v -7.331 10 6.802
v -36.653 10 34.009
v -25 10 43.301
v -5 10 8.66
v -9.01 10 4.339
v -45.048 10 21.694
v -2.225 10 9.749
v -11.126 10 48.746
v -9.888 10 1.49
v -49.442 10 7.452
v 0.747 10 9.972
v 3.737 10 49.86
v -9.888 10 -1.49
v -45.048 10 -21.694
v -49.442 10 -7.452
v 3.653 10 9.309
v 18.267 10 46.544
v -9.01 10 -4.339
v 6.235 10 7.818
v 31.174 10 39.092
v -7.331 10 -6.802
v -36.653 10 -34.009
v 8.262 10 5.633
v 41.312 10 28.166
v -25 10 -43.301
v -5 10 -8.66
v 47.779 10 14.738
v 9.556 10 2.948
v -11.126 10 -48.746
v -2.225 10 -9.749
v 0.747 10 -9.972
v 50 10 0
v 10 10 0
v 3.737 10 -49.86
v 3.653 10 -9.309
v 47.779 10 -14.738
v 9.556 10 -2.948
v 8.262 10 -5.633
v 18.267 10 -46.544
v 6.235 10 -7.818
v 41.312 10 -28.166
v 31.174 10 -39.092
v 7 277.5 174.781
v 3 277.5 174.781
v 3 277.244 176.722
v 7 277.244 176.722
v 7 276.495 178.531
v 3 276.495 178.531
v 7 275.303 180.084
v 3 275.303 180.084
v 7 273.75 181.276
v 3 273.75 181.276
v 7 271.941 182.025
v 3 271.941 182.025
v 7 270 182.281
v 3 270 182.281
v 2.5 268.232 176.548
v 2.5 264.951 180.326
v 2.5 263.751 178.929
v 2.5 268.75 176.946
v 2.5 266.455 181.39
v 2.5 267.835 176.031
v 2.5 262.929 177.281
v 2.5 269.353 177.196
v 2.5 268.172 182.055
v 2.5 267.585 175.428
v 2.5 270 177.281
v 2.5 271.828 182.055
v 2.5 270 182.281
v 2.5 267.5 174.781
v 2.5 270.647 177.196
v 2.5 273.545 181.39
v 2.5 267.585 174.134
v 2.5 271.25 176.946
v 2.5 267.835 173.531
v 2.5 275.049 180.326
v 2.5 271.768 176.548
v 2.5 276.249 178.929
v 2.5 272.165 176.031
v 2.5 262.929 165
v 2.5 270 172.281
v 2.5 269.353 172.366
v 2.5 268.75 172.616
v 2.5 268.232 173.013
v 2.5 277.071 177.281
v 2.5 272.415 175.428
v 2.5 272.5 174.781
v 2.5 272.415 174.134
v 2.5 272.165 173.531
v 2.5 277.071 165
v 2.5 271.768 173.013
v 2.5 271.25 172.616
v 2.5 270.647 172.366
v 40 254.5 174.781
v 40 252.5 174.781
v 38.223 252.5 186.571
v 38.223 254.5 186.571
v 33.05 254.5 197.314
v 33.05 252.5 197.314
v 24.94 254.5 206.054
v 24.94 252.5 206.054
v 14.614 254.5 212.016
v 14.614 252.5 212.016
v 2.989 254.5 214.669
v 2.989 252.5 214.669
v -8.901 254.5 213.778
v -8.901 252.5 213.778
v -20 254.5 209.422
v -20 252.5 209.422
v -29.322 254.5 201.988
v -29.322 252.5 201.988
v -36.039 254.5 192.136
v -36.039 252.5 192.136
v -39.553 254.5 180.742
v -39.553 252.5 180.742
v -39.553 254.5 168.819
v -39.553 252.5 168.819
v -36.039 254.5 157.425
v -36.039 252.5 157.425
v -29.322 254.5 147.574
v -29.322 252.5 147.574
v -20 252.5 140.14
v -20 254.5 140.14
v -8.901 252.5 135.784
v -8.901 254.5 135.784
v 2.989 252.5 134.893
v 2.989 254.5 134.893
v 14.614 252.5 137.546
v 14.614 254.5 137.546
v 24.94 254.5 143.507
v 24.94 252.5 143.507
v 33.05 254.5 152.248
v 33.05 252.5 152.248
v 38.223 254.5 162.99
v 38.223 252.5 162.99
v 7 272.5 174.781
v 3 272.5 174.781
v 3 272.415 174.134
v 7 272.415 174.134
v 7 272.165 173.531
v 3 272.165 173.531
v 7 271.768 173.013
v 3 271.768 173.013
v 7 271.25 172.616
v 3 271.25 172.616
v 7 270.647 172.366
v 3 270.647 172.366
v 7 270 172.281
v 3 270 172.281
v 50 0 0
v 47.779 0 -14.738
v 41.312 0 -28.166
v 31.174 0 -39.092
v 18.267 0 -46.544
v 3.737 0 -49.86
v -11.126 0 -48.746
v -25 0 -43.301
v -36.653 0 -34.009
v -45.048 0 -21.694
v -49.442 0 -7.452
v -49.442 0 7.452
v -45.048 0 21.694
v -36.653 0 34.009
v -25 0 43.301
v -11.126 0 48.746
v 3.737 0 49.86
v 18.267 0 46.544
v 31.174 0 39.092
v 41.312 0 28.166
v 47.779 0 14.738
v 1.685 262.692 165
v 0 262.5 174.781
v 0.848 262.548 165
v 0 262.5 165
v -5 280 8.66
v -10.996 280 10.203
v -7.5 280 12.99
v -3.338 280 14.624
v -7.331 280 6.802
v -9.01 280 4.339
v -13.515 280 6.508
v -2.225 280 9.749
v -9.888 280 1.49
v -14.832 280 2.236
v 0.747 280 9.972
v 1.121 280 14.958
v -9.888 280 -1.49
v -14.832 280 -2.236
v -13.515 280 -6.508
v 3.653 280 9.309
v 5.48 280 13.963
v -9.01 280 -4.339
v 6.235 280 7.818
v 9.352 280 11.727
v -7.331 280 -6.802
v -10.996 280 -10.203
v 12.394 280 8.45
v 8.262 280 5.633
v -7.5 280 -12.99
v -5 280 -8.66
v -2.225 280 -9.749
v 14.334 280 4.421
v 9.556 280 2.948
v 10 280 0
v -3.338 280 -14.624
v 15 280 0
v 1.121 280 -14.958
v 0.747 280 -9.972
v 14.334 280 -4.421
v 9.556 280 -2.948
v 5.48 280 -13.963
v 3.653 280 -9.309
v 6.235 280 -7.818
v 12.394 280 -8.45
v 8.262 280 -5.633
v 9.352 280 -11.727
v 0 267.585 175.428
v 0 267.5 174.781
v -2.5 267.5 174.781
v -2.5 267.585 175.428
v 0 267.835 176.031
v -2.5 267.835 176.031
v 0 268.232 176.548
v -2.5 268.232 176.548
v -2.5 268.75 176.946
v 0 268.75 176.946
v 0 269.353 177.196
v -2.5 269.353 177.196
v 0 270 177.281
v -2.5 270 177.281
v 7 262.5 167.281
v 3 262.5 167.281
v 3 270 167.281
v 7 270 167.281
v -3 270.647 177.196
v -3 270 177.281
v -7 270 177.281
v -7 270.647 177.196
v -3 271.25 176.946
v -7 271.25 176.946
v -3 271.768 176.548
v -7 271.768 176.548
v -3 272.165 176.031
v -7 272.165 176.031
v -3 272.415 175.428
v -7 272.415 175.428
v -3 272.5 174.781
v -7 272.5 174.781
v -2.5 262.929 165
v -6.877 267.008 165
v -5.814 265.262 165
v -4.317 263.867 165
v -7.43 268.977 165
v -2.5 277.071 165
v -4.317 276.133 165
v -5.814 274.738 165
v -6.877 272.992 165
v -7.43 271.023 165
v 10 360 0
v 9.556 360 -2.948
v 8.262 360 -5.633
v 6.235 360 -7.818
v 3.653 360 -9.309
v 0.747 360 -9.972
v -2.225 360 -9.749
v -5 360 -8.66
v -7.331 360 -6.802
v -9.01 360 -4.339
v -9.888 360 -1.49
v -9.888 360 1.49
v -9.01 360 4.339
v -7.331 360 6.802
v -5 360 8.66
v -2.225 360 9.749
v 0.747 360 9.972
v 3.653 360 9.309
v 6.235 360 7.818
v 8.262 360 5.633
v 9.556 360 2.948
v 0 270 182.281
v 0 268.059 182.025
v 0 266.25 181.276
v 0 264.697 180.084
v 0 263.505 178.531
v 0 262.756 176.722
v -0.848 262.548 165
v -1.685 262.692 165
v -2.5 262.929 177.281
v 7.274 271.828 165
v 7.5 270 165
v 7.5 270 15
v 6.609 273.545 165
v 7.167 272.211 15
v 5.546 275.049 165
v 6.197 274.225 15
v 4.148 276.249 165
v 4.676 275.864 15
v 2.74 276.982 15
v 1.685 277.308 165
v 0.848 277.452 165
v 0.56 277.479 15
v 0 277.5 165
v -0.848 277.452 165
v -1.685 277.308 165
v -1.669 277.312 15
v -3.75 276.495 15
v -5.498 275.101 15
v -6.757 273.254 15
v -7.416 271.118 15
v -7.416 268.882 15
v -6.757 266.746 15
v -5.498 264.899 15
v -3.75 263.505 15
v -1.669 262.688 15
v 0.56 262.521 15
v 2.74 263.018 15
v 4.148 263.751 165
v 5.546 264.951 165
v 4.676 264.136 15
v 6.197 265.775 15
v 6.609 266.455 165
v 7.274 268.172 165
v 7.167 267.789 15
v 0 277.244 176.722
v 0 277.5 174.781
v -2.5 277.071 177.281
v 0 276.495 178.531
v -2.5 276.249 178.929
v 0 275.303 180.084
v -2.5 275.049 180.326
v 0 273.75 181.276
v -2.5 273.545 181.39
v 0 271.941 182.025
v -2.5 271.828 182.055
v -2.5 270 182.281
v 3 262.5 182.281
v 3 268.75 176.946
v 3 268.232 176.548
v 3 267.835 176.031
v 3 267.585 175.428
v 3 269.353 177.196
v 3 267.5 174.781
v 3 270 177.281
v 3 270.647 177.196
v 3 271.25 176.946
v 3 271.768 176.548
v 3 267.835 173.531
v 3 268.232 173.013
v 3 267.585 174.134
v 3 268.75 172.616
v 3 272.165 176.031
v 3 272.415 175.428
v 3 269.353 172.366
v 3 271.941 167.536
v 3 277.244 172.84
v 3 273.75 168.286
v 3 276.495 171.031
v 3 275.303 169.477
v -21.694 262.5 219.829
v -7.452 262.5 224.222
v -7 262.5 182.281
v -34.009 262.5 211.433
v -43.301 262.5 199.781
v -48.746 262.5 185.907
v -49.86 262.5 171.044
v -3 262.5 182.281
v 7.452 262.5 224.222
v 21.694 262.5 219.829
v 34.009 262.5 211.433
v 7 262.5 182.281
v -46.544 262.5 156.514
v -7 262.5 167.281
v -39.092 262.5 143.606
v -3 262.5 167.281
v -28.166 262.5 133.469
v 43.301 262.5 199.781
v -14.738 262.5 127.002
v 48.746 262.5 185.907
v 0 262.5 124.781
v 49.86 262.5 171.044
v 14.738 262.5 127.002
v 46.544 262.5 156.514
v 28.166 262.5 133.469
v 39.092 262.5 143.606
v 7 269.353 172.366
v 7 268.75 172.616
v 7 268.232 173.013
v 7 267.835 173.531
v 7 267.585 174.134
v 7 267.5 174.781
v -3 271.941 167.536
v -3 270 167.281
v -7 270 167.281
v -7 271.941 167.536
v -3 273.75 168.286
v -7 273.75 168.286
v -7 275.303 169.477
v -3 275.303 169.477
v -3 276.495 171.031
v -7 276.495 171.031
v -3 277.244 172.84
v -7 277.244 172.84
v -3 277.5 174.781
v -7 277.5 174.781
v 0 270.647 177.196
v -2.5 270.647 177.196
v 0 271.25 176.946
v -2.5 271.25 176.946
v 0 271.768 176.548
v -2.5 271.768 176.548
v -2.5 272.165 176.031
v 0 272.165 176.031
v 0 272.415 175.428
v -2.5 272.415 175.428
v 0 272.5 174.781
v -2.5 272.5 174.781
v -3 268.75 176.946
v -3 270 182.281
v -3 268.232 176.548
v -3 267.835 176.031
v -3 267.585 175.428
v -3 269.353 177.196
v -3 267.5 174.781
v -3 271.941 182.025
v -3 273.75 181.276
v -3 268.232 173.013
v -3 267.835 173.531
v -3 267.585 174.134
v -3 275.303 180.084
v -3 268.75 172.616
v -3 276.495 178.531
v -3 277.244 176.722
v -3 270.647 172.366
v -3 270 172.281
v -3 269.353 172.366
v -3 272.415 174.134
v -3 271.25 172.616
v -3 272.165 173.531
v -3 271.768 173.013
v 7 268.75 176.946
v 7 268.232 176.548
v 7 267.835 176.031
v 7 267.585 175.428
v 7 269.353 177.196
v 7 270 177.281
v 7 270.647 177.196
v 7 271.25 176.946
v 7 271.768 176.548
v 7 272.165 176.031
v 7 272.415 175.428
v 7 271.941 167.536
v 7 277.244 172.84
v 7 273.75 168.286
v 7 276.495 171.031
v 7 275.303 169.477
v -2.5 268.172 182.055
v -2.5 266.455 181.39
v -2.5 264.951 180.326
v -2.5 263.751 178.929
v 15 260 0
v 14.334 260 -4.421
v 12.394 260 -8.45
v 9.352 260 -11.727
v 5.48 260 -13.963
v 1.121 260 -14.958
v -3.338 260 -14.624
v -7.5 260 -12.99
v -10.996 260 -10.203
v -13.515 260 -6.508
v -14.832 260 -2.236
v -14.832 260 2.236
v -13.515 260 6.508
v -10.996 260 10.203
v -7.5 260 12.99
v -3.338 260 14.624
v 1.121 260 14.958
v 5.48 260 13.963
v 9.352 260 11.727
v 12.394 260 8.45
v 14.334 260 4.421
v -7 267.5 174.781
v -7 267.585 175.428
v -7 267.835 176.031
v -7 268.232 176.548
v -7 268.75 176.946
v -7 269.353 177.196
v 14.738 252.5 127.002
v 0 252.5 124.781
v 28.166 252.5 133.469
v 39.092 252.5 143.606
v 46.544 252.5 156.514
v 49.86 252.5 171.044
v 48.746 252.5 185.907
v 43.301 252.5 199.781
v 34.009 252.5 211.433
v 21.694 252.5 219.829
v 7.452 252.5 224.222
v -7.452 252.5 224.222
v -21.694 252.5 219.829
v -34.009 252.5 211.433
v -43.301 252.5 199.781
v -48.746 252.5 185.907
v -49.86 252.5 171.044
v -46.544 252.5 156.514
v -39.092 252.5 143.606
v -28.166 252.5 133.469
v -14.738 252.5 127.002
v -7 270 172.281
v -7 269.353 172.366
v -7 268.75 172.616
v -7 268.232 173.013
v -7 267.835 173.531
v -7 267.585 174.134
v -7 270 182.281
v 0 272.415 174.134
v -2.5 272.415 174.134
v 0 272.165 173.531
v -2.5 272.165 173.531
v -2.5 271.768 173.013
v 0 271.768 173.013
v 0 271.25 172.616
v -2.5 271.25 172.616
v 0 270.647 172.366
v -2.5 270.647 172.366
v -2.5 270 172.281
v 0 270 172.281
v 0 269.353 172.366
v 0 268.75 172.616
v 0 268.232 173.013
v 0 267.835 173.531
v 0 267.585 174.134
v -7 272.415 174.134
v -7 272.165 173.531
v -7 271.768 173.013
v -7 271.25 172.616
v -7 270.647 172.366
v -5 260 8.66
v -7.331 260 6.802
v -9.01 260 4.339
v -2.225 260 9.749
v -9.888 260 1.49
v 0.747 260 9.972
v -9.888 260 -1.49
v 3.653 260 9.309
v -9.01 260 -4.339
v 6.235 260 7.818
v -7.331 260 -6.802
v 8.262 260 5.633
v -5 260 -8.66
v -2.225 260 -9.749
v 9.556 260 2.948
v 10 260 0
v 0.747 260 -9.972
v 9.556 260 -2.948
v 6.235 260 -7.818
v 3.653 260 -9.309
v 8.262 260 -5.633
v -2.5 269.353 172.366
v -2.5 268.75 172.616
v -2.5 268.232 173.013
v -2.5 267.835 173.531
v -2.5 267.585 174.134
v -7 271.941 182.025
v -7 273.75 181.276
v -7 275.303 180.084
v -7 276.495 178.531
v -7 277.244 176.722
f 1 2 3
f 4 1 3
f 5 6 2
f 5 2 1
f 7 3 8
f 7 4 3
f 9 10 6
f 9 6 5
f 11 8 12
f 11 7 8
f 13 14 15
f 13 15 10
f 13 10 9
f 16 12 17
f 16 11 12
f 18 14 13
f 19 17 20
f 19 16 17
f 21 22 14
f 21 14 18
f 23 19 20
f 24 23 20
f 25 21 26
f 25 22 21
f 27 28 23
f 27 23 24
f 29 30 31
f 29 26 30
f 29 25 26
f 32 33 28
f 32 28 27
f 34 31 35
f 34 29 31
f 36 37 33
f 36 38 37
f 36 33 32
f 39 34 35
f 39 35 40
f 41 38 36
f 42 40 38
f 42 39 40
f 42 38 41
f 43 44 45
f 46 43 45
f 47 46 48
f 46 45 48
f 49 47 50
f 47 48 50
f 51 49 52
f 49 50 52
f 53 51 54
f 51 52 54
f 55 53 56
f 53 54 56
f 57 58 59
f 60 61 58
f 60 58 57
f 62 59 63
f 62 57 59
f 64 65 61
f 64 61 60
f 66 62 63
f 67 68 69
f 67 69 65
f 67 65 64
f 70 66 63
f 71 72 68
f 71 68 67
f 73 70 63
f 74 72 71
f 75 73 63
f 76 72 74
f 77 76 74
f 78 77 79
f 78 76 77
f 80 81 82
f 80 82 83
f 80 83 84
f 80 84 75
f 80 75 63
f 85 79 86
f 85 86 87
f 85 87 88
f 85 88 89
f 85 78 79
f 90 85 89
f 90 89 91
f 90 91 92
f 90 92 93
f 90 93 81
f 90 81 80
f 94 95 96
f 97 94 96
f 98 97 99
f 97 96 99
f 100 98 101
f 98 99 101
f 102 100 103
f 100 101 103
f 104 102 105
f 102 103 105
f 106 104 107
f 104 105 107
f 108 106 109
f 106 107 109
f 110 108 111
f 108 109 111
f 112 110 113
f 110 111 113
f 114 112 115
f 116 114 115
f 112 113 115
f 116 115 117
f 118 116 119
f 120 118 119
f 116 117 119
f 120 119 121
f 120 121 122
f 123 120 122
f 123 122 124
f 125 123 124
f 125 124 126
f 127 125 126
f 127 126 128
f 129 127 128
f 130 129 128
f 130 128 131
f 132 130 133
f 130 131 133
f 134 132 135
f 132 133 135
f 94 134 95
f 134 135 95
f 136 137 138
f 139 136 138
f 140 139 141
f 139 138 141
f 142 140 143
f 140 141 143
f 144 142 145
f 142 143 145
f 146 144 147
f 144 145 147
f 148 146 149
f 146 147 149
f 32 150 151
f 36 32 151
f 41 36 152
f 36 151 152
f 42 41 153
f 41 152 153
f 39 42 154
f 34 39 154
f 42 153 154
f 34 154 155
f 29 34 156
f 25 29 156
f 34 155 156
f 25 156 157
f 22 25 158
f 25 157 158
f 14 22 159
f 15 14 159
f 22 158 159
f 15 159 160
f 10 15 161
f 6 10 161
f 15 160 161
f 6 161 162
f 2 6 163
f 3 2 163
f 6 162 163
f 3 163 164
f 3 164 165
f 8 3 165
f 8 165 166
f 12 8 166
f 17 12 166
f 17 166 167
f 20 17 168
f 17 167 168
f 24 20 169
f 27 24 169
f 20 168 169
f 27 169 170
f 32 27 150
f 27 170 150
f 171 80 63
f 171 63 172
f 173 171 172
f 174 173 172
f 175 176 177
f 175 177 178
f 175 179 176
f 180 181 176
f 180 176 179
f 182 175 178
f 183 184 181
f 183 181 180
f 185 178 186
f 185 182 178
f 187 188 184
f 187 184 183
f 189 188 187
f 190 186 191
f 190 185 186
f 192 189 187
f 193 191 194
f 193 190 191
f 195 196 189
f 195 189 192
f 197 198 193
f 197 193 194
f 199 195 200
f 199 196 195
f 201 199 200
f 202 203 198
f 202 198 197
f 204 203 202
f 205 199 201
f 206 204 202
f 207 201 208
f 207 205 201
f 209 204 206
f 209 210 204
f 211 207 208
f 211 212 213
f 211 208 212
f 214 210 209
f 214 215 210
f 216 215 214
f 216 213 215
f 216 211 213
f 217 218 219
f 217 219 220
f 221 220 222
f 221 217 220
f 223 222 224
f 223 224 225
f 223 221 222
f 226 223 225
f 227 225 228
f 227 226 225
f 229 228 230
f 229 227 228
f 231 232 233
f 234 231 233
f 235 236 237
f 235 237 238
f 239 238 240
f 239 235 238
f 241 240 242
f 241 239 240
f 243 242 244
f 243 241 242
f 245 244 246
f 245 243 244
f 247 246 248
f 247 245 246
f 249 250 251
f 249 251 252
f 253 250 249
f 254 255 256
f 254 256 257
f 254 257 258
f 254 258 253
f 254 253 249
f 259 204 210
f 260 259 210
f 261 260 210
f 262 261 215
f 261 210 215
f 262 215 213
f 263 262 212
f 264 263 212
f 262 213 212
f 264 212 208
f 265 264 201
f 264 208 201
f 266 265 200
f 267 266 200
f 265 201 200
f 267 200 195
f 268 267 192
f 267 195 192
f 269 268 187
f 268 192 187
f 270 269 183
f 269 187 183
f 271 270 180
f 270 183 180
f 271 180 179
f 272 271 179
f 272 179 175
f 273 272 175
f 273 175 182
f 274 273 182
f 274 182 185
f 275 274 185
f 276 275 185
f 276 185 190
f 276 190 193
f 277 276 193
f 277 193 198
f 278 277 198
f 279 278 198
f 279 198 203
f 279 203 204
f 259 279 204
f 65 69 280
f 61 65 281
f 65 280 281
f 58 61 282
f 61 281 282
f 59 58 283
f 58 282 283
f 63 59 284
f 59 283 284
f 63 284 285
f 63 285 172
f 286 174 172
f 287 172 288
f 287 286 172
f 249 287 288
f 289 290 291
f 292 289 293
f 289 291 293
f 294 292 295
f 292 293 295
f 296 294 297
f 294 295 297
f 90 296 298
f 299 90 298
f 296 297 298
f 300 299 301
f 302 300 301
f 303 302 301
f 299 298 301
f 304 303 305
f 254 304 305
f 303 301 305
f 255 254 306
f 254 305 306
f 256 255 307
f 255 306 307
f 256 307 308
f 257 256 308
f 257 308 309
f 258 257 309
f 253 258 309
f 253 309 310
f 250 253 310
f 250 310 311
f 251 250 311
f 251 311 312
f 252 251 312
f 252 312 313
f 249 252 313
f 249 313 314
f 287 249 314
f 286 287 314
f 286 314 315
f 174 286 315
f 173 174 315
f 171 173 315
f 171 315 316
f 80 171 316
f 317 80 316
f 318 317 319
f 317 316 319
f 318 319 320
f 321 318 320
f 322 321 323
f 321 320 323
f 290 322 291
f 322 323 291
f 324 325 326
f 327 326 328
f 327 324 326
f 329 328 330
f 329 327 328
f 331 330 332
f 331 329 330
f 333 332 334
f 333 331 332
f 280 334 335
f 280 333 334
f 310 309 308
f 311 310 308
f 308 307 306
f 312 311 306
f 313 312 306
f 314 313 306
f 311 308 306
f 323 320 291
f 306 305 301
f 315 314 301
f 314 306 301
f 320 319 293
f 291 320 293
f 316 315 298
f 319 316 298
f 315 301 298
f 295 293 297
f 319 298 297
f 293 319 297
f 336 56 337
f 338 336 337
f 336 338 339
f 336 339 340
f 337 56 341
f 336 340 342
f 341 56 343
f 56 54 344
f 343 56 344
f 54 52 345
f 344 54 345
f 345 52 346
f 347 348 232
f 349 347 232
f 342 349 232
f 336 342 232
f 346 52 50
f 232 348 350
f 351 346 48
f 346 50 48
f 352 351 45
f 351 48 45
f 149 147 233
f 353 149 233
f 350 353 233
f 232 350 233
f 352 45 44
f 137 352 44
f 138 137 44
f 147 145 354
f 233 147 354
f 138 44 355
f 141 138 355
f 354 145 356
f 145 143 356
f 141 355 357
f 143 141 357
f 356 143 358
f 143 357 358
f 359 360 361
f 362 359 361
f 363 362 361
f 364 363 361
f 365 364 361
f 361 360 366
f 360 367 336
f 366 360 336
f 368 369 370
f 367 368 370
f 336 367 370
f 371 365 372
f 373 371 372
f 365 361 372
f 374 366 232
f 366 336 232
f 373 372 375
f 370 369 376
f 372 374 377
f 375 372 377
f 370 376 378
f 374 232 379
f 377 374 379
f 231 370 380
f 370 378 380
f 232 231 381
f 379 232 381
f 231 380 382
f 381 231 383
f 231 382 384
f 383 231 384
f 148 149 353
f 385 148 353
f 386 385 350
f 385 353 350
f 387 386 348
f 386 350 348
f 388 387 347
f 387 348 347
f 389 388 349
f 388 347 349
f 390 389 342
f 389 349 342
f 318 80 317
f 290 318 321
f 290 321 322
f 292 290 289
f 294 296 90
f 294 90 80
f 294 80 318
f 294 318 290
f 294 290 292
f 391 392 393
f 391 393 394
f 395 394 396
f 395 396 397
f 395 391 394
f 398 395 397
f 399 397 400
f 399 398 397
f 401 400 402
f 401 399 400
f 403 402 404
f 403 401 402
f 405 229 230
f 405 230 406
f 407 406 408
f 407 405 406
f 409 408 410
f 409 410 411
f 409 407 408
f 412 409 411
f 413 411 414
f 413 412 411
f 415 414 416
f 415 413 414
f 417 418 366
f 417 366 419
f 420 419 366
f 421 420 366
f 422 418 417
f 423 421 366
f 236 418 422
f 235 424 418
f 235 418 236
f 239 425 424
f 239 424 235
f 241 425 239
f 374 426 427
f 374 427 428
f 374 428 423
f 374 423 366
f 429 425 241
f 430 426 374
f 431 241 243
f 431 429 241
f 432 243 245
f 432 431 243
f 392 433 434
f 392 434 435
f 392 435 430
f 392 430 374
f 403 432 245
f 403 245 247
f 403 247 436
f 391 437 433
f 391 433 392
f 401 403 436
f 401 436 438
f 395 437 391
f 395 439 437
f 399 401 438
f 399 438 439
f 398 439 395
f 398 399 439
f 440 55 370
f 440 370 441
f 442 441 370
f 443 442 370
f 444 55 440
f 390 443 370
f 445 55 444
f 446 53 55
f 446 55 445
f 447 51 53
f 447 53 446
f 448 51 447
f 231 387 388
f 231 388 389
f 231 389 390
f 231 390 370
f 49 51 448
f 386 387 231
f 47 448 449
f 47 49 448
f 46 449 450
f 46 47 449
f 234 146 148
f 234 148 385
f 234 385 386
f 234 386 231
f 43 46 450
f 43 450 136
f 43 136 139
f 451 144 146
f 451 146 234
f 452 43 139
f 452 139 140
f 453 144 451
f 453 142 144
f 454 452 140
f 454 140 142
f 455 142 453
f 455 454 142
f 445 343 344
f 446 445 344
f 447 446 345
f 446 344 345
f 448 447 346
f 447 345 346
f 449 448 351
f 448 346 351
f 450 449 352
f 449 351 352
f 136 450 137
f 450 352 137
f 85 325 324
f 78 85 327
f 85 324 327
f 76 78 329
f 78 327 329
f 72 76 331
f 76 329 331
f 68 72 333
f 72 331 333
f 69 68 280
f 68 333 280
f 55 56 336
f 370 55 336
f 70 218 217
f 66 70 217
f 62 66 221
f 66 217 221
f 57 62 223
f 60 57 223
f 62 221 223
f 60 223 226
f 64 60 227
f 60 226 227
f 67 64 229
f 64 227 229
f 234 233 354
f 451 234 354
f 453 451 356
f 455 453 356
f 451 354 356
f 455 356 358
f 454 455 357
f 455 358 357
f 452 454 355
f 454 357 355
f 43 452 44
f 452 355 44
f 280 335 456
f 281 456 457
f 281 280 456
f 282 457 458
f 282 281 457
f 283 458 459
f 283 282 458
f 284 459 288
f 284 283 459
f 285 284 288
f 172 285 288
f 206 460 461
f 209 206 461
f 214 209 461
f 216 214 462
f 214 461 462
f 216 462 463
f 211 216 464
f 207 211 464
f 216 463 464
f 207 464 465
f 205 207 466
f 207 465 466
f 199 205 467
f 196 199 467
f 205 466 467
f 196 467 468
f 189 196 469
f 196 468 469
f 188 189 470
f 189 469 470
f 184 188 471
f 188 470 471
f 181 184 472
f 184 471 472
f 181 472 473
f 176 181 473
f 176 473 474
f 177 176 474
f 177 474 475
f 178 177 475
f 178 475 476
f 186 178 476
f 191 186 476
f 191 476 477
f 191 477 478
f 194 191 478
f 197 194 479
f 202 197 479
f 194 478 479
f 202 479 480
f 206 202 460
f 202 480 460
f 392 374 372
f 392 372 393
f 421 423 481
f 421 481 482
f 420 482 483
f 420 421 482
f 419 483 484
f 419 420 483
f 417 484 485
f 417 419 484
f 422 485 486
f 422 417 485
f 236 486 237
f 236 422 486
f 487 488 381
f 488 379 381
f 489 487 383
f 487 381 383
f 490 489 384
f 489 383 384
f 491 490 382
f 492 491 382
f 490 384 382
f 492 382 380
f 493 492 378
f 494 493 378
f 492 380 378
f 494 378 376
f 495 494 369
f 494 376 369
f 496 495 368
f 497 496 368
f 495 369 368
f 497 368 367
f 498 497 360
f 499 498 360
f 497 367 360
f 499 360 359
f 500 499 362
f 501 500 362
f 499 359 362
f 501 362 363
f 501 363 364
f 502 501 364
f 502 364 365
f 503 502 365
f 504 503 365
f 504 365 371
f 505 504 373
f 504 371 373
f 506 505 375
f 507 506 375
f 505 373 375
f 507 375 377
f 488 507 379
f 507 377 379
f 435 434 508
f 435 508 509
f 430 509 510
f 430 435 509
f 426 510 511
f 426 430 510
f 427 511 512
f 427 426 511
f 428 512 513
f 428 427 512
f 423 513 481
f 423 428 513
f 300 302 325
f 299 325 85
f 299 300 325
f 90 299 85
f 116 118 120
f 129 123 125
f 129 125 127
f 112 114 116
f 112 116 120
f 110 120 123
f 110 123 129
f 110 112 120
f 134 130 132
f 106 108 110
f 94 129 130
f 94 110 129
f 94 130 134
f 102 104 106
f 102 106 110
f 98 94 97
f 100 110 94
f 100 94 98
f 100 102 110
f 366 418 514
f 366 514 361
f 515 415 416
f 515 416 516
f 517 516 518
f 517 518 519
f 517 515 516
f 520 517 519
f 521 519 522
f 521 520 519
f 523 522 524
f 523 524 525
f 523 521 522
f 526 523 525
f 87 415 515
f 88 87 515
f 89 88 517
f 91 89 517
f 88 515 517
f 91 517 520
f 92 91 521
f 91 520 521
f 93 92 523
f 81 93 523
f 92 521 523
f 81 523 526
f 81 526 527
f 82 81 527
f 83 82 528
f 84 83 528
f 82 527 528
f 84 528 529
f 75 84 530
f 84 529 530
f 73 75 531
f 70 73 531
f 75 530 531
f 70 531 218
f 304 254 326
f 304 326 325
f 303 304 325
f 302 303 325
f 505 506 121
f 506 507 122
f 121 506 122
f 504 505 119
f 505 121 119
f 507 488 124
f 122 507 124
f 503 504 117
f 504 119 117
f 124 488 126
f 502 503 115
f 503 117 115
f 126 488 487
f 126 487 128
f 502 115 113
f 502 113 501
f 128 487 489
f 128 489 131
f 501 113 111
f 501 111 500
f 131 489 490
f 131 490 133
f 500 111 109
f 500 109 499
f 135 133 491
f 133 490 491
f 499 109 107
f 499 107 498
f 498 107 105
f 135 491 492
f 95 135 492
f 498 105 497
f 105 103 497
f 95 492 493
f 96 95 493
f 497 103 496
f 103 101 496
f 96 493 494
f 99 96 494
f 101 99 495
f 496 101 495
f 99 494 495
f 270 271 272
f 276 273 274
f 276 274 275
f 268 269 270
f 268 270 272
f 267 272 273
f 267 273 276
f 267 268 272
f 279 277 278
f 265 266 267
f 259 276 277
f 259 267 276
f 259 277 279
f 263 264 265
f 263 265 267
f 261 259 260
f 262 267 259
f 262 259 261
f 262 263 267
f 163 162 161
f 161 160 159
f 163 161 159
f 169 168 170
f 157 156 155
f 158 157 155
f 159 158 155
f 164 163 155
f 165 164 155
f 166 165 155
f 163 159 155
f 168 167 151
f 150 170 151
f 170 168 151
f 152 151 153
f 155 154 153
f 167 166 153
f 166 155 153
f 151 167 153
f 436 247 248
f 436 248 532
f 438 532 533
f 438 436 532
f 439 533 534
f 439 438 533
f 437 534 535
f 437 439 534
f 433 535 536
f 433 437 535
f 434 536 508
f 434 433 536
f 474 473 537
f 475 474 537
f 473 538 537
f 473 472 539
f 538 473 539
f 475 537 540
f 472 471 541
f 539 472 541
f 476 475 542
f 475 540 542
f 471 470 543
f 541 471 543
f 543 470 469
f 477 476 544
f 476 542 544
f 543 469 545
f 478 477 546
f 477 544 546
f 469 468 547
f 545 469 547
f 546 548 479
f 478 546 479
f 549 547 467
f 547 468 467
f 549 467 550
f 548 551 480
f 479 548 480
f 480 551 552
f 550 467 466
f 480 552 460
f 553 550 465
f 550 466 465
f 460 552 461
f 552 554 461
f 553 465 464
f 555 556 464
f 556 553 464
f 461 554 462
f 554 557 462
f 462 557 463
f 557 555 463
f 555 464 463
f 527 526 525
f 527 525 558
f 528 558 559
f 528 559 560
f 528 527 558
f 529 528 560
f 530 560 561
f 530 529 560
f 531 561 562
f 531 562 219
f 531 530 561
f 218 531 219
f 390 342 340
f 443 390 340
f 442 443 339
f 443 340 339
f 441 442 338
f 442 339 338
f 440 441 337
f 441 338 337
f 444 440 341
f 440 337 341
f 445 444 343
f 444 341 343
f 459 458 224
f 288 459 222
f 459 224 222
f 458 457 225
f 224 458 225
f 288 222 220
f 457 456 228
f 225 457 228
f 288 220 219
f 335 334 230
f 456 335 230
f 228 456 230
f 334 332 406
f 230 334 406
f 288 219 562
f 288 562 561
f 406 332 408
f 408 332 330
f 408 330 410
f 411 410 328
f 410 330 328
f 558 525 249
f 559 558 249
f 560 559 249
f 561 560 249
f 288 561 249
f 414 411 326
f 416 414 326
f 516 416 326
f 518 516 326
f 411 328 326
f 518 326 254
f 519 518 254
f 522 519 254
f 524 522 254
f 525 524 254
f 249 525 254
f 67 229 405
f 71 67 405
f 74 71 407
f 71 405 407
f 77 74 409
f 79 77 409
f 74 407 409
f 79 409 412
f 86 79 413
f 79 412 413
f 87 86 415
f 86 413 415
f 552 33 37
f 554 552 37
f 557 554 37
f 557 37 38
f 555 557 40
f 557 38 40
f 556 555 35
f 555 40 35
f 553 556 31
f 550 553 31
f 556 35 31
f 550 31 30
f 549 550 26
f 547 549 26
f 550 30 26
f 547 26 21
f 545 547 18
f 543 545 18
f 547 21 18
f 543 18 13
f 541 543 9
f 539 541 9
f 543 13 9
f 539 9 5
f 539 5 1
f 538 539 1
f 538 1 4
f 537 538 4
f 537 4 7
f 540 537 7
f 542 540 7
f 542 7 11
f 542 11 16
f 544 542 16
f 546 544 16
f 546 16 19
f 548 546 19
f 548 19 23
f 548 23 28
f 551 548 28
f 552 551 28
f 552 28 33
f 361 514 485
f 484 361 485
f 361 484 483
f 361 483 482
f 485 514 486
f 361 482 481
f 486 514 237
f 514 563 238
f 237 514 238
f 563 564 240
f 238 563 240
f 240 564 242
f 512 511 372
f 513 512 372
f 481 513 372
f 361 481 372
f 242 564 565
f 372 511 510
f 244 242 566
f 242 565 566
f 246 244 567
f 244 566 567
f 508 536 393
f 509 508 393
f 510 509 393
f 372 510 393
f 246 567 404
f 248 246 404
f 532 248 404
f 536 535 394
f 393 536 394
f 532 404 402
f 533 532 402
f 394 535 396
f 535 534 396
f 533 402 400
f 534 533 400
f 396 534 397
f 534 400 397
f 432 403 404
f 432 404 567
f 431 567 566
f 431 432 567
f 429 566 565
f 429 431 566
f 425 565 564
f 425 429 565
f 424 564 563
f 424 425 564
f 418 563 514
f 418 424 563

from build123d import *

# Parameters (mm, degrees)
SKETCH1_R           = 50
BOSS_EXTRUDE1_DEPTH = 10
SKETCH2_R           = 10
BOSS_EXTRUDE2_DEPTH = 350
SKETCH3_R           = 15
SKETCH3_R_2         = 10
BOSS_EXTRUDE3_DEPTH = 20
SKETCH4_R           = 7.5
BOSS_EXTRUDE4_DEPTH = 150
SKETCH5_R           = 2.5
BOSS_EXTRUDE5_DEPTH = 2.5
SKETCH6_R           = 48.158444965
CUT_EXTRUDE1_DEPTH  = 15
BOSS_EXTRUDE6_START = 3
SKETCH5_3_R         = 2.5
BOSS_EXTRUDE6_DEPTH = 4
BOSS_EXTRUDE7_START = -3
SKETCH5_4_R         = 2.5
BOSS_EXTRUDE7_DEPTH = 4
SKETCH7_R           = 40
CUT_EXTRUDE2_DEPTH  = 2


with BuildPart() as part:
    # Sketch1 → Boss-Extrude1 (new body)
    with BuildSketch(Plane(origin=(0, 0, 0), x_dir=(1, 0, 0), z_dir=(0, 1, 0))):
        Circle(SKETCH1_R)
    extrude(amount=BOSS_EXTRUDE1_DEPTH)

    # Sketch2 → Boss-Extrude2 (add)
    with BuildSketch(Plane(origin=(0, 10, 0), x_dir=(1, 0, 0), z_dir=(0, 1, 0))):
        Circle(SKETCH2_R)
    extrude(amount=BOSS_EXTRUDE2_DEPTH)

    # Sketch3 → Boss-Extrude3 (add)
    with BuildSketch(Plane(origin=(0, 260, 0), x_dir=(1, 0, 0), z_dir=(0, 1, 0))):
        Circle(SKETCH3_R)
        Circle(SKETCH3_R_2, mode=Mode.SUBTRACT)
    extrude(amount=BOSS_EXTRUDE3_DEPTH)


with BuildPart() as body_2:
    # Sketch4 → Boss-Extrude4 (new body)
    with BuildSketch(Plane.XY.offset(15)):
        with Locations((0, 270)):
            Circle(SKETCH4_R)
    extrude(amount=BOSS_EXTRUDE4_DEPTH)

    # Sketch5 → Boss-Extrude5 (add, symmetric)
    with BuildSketch(Plane(origin=(0, 0, 0), x_dir=(0, 0, -1), z_dir=(1, 0, 0))):
        with BuildLine():
            Line((-165, 262.5), (-165, 277.5))
            Line((-165, 277.5), (-174.780705462, 277.5))
            ThreePointArc((-174.780705462, 277.5), (-182.280705462, 270), (-174.780705462, 262.5))
            Line((-174.780705462, 262.5), (-165, 262.5))
        make_face()
        with Locations((-174.780705462, 270)):
            Circle(SKETCH5_R, mode=Mode.SUBTRACT)
    extrude(amount=BOSS_EXTRUDE5_DEPTH, both=True)

    # Sketch6 → Cut-Extrude1 (cut)
    with BuildSketch(Plane.XY.offset(165)):
        with Locations((0, 270)):
            Circle(SKETCH6_R)
        with BuildLine():
            ThreePointArc((2.5, 262.928932188), (-7.5, 270), (2.5, 277.071067812))
            ThreePointArc((2.5, 277.071067812), (6.123724357, 274.330127019), (7.5, 270))
            ThreePointArc((7.5, 270), (6.123724357, 265.669872981), (2.5, 262.928932188))
        make_face(mode=Mode.SUBTRACT)
    extrude(amount=CUT_EXTRUDE1_DEPTH, mode=Mode.SUBTRACT)


with BuildPart() as body_3:
    # Sketch5<3> → Boss-Extrude6 (new body)
    with BuildSketch(Plane(origin=(0, 0, 0), x_dir=(0, 0, -1), z_dir=(1, 0, 0)).offset(BOSS_EXTRUDE6_START)):
        with BuildLine():
            ThreePointArc((-167.280705462, 270), (-174.780705462, 277.5), (-182.280705462, 270))
            Line((-182.280705462, 270), (-182.280705462, 262.5))
            Line((-182.280705462, 262.5), (-167.280705462, 262.5))
            Line((-167.280705462, 262.5), (-167.280705462, 270))
        make_face()
        with Locations((-174.780705462, 270)):
            Circle(SKETCH5_3_R, mode=Mode.SUBTRACT)
    extrude(amount=BOSS_EXTRUDE6_DEPTH)



with BuildPart() as body_4:
    # Sketch5<4> → Boss-Extrude7 (new body)
    with BuildSketch(Plane(origin=(0, 0, 0), x_dir=(0, 0, -1), z_dir=(1, 0, 0)).offset(BOSS_EXTRUDE7_START)):
        with BuildLine():
            ThreePointArc((-167.280705462, 270), (-174.780705462, 277.5), (-182.280705462, 270))
            Line((-182.280705462, 270), (-182.280705462, 262.5))
            Line((-182.280705462, 262.5), (-167.280705462, 262.5))
            Line((-167.280705462, 262.5), (-167.280705462, 270))
        make_face()
        with Locations((-174.780705462, 270)):
            Circle(SKETCH5_4_R, mode=Mode.SUBTRACT)
    extrude(amount=-BOSS_EXTRUDE7_DEPTH)


with BuildPart() as body_3_1:
    add(body_3.part)

    add(body_4.part)  # Revolve1 merges body 4
    # Sketch5<5> → Revolve1 (revolve)
    with BuildSketch(Plane(origin=(0, 0, 0), x_dir=(0, 0, -1), z_dir=(1, 0, 0))):
        Polygon((-124.780705462, 262.5), (-165, 262.5), (-167.280705462, 262.5), (-174.780705462, 262.5), (-174.780705462, 252.5), (-124.780705462, 252.5), align=None)
    revolve(axis=Axis((0, 262.5, 174.780705462), (0, -1, 0)))

    # Sketch7 → Cut-Extrude2 (cut)
    with BuildSketch(Plane.XZ.offset(-252.5)):
        with Locations((0, 174.780705462)):
            Circle(SKETCH7_R)
    extrude(amount=-CUT_EXTRUDE2_DEPTH, mode=Mode.SUBTRACT)


solid = Compound([part.part, body_2.part, body_3_1.part])
